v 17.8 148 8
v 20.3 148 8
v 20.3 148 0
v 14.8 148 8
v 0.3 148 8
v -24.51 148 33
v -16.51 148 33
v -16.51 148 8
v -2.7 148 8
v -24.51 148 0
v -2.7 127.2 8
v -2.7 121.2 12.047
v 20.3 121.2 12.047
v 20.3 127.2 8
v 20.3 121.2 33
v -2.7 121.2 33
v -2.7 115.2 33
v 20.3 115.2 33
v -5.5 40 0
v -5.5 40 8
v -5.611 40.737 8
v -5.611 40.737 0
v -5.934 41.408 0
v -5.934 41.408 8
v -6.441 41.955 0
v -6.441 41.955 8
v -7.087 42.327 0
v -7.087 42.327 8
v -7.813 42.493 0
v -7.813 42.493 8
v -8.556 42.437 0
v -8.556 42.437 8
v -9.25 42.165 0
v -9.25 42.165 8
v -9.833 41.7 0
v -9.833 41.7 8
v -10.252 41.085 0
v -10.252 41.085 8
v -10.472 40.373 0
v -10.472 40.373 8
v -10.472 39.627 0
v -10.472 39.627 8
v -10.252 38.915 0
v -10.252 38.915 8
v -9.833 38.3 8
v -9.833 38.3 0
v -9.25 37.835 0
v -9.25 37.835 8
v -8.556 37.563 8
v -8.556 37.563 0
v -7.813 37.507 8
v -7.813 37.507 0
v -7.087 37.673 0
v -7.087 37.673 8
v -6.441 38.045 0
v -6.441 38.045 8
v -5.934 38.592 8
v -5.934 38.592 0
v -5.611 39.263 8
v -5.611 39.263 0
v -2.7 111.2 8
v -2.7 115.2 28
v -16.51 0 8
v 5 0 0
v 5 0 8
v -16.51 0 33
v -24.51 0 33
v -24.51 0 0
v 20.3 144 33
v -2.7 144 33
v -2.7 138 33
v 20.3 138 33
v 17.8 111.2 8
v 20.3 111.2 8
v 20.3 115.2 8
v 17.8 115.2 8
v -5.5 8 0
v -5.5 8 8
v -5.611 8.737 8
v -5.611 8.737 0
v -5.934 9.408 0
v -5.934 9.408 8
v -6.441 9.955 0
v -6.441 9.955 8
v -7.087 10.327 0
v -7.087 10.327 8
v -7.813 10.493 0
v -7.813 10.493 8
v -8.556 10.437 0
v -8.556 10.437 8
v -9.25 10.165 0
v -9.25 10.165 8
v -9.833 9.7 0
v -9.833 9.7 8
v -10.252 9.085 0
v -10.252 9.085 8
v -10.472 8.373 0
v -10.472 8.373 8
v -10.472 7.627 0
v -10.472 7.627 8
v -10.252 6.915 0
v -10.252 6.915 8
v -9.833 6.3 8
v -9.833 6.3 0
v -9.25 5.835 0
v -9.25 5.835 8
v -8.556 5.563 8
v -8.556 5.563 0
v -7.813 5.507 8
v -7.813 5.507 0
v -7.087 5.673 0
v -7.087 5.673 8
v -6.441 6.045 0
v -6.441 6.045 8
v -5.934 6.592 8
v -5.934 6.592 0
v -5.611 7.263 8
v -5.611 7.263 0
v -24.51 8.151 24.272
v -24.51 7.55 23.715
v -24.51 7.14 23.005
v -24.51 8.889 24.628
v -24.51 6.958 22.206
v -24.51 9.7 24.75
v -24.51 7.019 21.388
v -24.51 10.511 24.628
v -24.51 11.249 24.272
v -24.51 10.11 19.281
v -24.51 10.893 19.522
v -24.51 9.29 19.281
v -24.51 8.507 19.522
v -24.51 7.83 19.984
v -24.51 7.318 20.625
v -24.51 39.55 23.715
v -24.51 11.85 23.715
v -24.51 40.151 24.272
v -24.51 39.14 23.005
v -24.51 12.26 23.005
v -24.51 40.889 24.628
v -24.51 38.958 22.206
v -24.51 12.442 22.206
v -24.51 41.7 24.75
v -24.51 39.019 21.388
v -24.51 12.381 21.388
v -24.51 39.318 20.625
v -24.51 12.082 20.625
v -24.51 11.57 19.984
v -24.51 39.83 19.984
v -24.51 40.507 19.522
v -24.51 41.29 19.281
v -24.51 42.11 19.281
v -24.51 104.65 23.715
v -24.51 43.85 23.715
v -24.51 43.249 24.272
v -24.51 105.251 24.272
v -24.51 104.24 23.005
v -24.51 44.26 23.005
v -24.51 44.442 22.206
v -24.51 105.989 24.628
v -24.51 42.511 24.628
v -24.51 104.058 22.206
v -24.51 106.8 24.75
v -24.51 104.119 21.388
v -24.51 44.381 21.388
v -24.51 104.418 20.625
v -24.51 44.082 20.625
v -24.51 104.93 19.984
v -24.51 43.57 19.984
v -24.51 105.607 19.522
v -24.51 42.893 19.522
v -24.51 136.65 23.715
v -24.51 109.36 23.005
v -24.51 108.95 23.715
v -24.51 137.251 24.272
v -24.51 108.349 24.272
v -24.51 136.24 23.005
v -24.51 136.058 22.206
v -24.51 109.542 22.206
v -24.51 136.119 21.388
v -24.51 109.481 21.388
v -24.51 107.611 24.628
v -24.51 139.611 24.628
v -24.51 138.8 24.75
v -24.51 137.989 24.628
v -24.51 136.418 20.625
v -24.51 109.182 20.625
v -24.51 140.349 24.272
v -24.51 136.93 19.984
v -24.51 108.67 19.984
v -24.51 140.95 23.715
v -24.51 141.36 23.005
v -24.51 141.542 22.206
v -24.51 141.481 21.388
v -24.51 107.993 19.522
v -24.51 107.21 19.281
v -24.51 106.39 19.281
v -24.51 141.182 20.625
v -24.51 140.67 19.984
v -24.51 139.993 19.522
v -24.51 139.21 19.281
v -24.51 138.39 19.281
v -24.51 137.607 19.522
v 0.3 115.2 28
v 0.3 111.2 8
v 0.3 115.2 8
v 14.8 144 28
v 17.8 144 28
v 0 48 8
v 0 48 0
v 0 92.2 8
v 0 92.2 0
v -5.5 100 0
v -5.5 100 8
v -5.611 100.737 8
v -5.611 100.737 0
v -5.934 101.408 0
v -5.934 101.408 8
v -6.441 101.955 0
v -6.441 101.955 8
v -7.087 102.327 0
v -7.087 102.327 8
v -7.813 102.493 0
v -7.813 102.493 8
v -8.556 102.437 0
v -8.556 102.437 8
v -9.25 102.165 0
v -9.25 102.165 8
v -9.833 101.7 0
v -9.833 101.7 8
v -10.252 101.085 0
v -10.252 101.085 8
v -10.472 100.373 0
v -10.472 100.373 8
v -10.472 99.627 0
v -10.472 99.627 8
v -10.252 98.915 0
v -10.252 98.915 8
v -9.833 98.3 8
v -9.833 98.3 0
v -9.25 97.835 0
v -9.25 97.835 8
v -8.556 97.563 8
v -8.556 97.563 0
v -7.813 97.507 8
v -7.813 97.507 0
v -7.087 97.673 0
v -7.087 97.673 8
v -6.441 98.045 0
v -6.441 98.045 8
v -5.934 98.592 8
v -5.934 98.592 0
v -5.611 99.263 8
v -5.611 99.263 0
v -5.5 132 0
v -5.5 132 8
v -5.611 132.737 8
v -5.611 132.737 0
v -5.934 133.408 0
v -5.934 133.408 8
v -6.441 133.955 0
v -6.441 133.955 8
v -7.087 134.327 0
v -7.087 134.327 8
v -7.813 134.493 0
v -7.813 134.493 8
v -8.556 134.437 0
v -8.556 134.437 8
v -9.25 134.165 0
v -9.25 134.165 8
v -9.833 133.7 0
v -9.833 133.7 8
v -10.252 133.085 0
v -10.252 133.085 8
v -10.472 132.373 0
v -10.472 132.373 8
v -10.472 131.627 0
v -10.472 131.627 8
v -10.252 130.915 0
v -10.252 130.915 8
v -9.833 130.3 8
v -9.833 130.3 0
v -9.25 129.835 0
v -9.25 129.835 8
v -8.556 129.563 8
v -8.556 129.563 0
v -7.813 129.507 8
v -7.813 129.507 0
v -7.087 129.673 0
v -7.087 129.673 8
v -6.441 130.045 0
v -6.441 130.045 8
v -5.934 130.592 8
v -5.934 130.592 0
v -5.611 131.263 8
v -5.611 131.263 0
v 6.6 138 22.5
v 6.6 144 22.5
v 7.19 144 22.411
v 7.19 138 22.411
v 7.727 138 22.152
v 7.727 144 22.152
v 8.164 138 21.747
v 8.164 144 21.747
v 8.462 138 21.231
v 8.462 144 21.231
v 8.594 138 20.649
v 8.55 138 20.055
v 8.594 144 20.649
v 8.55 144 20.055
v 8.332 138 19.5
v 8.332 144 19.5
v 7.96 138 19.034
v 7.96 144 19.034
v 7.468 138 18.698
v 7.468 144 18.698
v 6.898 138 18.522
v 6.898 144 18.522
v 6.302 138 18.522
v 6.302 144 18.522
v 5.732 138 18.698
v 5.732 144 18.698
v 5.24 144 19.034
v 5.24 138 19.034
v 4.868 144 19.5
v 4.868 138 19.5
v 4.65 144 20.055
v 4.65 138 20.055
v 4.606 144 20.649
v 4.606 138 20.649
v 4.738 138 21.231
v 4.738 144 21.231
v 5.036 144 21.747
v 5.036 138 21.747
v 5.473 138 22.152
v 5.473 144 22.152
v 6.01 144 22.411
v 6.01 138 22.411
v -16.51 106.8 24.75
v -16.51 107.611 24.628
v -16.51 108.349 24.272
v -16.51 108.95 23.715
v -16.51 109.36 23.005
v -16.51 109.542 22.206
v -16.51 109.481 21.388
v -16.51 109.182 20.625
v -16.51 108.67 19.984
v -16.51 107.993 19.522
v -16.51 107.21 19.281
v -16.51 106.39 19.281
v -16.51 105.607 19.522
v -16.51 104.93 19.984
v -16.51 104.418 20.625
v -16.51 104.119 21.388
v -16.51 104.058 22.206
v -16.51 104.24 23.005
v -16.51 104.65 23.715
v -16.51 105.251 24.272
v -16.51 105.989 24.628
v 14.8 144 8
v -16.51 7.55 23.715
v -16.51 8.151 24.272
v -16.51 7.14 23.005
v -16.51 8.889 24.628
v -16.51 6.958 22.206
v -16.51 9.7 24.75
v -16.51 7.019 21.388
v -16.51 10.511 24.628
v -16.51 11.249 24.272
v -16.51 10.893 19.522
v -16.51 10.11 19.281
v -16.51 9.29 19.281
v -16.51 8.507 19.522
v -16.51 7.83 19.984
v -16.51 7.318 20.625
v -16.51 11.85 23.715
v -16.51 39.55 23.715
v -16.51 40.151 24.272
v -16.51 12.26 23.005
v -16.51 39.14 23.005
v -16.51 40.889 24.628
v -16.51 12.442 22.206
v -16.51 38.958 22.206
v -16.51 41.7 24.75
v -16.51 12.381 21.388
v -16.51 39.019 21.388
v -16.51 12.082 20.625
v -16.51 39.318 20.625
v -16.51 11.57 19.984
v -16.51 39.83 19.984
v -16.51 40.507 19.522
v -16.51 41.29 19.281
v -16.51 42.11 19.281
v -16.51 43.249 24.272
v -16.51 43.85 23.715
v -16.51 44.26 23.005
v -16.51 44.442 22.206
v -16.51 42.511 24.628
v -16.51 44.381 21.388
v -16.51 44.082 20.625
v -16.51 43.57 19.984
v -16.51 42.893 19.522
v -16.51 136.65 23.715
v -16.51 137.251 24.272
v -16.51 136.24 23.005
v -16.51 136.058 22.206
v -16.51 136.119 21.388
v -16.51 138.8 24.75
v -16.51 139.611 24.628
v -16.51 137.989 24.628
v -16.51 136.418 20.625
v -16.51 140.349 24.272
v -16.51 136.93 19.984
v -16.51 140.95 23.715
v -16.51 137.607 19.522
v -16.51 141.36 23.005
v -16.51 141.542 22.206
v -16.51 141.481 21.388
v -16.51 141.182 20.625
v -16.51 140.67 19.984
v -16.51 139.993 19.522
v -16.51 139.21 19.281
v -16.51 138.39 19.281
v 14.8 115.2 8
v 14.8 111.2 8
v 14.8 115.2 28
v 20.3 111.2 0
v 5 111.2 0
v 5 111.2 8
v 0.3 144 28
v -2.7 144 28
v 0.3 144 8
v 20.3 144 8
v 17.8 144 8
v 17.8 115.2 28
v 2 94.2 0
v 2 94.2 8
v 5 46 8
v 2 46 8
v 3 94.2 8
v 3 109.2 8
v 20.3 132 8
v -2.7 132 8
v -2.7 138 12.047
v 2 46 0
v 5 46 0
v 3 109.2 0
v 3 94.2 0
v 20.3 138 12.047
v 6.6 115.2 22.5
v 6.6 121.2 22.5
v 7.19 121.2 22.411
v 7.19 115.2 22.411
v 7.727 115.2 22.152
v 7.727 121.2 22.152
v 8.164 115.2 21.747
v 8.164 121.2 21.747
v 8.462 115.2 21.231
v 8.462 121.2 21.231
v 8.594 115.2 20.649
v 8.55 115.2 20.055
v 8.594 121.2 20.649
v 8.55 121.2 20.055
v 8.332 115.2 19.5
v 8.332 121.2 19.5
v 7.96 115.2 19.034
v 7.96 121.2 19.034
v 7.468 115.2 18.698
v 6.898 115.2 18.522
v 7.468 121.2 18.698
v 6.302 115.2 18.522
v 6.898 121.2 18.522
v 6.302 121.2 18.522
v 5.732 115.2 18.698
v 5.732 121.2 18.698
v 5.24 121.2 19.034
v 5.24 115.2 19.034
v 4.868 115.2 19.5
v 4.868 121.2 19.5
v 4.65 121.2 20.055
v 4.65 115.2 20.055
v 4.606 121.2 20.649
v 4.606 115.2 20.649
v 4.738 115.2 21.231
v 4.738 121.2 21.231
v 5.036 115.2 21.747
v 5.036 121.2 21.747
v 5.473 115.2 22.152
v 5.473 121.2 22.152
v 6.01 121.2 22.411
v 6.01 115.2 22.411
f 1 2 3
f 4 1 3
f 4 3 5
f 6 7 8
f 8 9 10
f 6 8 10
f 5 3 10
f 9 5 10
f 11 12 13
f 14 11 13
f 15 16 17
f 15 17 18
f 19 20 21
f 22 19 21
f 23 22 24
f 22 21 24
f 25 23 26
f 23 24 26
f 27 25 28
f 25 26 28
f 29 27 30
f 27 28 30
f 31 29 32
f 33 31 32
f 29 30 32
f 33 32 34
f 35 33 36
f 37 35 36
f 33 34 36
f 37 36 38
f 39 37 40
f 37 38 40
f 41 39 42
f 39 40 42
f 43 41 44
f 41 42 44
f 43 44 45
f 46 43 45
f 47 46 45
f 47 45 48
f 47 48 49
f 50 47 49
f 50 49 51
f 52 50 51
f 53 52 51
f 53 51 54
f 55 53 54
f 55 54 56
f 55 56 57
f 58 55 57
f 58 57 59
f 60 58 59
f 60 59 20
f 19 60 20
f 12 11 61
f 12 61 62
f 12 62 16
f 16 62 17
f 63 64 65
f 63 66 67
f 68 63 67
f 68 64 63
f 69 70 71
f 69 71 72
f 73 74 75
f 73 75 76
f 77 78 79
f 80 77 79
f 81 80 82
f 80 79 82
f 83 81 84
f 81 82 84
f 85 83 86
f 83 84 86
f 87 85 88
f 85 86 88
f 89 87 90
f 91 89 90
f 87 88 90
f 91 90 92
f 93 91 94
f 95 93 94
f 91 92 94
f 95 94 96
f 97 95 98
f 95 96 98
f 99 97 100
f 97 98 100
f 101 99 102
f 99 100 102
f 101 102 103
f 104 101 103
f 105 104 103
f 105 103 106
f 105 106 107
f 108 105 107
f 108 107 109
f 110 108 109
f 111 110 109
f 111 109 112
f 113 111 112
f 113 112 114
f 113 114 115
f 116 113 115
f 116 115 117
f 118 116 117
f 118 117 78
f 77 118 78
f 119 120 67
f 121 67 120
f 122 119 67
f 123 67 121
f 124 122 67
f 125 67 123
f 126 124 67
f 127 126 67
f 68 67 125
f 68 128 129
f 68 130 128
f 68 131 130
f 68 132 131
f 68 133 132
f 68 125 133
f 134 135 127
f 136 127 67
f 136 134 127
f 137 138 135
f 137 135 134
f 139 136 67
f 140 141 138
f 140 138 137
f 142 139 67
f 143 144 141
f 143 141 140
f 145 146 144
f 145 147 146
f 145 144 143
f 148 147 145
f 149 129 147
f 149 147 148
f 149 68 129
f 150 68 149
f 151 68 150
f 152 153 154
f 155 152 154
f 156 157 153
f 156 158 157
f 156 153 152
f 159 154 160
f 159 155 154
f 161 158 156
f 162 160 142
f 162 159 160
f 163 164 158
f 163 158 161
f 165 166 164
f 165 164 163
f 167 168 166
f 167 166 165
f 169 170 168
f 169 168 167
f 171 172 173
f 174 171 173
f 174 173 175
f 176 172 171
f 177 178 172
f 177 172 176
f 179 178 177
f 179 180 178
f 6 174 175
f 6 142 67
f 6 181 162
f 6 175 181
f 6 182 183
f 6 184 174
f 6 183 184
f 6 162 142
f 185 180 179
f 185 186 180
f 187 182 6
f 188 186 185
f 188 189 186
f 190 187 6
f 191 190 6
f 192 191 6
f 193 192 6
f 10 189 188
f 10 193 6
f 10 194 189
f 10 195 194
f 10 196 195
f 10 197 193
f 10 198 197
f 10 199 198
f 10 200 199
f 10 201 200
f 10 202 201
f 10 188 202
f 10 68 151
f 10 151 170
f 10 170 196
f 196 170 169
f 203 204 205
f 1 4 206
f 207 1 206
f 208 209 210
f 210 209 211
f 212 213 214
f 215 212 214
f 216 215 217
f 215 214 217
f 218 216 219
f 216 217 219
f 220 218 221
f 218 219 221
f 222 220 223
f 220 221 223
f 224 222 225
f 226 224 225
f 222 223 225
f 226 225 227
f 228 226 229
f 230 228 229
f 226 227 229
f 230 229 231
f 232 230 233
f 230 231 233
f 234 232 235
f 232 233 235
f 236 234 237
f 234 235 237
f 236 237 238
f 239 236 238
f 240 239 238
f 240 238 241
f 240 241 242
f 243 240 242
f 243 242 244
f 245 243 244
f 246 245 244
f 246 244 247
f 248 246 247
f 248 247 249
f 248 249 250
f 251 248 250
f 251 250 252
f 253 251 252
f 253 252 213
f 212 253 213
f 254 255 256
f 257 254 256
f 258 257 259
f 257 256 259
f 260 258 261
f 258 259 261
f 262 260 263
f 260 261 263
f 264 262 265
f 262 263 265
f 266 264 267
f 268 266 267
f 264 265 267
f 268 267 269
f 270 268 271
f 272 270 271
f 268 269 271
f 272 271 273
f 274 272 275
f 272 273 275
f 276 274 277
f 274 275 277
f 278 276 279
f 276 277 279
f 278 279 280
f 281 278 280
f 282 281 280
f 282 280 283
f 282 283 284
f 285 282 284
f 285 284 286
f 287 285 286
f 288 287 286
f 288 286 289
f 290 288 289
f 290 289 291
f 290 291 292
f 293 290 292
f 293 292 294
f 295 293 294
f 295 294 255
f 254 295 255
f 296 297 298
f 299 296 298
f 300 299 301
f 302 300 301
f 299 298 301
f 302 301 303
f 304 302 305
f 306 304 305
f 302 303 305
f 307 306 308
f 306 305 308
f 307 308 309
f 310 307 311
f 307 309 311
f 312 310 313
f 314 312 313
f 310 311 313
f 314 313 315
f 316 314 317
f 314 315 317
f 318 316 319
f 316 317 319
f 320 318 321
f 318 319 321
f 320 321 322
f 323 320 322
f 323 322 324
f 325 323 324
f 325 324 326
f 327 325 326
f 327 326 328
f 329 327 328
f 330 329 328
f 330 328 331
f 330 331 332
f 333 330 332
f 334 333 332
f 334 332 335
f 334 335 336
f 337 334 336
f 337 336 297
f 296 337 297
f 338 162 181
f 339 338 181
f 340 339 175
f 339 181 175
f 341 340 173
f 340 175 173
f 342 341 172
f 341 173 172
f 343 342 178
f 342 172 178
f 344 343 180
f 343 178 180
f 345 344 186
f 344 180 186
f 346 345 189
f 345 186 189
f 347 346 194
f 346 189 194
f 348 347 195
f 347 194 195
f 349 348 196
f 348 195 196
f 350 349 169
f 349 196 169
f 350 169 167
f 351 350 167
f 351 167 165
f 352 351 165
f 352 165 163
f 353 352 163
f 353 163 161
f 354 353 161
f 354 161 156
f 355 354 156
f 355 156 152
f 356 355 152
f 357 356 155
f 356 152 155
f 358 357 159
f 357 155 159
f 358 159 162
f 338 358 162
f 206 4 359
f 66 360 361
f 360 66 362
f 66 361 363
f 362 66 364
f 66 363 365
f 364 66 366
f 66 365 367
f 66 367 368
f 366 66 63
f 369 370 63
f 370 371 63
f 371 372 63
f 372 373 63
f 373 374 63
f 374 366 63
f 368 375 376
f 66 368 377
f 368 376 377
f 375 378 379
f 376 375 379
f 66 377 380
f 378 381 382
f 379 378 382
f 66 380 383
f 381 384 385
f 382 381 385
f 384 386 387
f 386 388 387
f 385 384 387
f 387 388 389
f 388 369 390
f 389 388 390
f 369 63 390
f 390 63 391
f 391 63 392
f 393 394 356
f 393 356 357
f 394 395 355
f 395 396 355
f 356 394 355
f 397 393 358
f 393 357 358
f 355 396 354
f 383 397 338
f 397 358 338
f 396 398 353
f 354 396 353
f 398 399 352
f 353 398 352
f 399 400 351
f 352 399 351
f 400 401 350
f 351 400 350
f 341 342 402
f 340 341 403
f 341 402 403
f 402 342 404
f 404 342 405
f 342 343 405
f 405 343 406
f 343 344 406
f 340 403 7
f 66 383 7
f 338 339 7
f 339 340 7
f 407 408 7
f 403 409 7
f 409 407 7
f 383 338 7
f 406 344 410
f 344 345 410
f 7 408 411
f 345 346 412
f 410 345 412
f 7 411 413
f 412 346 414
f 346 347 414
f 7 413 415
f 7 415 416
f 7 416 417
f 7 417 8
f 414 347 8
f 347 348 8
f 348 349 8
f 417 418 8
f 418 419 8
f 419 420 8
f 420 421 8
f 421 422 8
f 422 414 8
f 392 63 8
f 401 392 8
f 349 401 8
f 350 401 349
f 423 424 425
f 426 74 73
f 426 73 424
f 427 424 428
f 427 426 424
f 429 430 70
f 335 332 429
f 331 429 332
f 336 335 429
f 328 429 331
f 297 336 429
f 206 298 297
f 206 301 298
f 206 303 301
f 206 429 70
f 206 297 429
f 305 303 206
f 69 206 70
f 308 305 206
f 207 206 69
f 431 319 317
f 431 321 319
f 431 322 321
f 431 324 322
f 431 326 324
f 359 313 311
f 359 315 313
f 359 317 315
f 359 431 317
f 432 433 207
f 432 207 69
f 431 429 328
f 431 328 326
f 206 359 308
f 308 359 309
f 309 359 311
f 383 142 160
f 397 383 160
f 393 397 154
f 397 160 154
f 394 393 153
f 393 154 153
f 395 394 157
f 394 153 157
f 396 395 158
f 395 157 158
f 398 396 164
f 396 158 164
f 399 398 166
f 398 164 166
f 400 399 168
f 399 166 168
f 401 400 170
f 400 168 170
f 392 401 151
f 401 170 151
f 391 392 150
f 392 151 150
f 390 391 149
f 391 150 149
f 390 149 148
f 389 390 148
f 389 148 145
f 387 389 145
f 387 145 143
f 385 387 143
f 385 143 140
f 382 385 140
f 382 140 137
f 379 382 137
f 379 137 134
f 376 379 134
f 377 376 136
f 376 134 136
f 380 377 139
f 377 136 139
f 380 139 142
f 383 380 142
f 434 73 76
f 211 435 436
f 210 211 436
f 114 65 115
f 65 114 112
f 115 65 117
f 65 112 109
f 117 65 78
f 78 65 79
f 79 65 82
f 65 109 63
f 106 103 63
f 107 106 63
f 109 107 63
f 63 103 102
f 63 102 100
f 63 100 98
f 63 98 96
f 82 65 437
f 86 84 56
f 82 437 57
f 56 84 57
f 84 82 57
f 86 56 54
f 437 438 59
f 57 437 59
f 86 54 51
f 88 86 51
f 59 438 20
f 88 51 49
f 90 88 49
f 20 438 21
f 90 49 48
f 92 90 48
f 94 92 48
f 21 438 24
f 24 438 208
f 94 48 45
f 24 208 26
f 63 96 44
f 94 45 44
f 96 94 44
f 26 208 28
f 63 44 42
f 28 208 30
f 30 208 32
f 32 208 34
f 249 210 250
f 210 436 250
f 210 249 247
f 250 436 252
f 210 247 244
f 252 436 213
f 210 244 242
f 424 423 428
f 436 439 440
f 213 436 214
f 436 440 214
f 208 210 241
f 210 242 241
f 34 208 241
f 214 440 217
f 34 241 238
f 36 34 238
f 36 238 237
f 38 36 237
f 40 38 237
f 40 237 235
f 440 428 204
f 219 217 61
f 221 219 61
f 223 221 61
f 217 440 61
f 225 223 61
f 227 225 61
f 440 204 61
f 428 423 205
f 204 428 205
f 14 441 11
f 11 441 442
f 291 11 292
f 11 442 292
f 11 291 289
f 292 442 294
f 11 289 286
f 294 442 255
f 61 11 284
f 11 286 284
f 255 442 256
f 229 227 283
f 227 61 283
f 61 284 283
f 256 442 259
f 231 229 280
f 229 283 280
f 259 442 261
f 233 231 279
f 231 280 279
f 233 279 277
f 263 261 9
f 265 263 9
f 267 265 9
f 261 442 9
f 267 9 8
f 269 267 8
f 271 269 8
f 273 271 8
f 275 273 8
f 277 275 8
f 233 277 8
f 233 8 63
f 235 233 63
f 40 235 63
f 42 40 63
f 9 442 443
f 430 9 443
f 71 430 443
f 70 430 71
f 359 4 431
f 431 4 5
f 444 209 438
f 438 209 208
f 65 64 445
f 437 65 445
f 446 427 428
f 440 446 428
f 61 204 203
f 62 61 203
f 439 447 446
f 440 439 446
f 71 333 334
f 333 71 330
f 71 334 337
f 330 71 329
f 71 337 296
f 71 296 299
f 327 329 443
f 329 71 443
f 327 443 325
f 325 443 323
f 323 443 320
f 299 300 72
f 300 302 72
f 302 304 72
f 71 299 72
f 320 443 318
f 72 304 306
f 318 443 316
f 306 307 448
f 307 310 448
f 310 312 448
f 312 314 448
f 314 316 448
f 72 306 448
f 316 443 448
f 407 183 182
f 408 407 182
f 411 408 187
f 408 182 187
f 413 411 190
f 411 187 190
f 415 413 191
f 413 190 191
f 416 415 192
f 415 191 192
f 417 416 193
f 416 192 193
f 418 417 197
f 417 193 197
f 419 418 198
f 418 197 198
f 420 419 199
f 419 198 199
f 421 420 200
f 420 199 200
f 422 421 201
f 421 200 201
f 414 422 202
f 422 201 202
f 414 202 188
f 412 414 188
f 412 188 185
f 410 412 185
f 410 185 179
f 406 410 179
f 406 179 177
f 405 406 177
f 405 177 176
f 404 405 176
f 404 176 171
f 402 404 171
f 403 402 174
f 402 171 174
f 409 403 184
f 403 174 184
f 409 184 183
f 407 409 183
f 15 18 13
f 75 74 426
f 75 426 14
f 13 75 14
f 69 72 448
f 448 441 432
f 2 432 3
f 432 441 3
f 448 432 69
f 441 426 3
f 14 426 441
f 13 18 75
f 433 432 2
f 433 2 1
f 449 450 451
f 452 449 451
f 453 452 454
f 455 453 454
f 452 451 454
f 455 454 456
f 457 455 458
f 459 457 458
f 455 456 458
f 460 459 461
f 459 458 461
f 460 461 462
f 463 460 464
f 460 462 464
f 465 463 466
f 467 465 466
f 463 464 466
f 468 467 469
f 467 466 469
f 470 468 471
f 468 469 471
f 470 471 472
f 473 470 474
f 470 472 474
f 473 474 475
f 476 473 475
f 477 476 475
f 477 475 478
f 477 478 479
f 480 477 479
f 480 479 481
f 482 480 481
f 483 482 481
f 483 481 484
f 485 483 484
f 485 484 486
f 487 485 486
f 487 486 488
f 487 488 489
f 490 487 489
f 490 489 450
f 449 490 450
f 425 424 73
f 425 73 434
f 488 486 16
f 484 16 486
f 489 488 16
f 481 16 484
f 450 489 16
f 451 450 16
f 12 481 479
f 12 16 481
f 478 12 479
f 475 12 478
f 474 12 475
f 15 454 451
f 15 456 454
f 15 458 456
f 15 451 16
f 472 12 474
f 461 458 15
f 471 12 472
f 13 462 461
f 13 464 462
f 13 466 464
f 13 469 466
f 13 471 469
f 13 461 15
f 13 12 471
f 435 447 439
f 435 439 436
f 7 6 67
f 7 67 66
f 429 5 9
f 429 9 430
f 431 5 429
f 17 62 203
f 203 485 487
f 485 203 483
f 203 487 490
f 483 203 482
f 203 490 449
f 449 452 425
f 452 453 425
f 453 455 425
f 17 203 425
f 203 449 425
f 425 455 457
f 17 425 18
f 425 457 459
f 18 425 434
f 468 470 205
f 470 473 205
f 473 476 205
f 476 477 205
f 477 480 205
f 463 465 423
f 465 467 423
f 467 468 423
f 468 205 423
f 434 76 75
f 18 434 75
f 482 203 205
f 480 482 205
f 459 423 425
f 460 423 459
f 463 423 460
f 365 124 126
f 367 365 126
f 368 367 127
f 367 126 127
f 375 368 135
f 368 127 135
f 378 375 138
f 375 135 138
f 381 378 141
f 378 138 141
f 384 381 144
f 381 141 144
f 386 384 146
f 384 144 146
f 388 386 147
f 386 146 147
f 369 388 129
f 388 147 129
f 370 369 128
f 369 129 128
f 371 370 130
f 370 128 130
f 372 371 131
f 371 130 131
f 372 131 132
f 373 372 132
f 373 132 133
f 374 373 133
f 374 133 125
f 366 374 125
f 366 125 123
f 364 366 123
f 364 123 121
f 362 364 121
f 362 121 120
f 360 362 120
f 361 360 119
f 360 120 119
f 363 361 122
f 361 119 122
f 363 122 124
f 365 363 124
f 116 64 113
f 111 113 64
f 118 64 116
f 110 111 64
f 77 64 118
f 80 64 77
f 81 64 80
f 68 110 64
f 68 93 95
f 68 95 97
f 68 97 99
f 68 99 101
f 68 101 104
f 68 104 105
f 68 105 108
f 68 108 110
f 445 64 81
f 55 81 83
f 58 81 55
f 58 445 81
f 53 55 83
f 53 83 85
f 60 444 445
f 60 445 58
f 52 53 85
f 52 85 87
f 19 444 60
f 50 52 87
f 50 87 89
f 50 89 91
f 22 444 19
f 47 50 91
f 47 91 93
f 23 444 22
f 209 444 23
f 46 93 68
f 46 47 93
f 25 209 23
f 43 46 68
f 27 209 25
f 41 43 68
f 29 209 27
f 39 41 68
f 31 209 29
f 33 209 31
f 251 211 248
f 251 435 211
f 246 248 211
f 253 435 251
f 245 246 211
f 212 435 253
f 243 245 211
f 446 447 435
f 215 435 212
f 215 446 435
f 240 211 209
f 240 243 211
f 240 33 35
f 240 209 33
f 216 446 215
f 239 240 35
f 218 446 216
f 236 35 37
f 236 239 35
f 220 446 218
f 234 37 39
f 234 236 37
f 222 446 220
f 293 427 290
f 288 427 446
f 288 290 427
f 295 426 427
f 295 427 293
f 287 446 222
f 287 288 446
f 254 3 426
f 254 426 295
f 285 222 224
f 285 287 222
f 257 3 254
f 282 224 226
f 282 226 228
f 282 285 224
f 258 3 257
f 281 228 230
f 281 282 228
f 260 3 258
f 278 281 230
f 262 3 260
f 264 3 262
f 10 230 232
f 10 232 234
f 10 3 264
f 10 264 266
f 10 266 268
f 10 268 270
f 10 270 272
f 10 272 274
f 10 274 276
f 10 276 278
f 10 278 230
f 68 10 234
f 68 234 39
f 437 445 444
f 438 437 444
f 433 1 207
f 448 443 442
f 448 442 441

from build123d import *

# Parameters (mm, degrees)
SKETCH1_W               = 24.51
SKETCH1_H               = 148
BOSS_EXTRUDE1_DEPTH     = 8
SKETCH2_W               = 8
SKETCH2_H               = 148
BOSS_EXTRUDE2_DEPTH     = 25
SKETCH4_W               = 20.3
SKETCH4_H               = 36.8
BOSS_EXTRUDE3_DEPTH     = 8
SKETCH5_W               = 23
SKETCH5_H               = 6
BOSS_EXTRUDE4_DEPTH     = 25
CUT_EXTRUDE2_REACH      = 151.752
SKETCH6_R               = 2
RIB1_REACH              = 159.03
SKETCH8_WALL_W          = 336.456302216
SKETCH8_WALL_H          = 3
MIRROR2_COPY_1_REACH    = 159.03
MIRROR2_COPY_1_SKETCH_W = 336.456302216
MIRROR2_COPY_1_SKETCH_H = 3
SKETCH3_R               = 2.5
CUT_EXTRUDE1_DEPTH      = 10
SKETCH12_R              = 2.75
CUT_EXTRUDE3_DEPTH      = 8
SKETCH13_W              = 5
SKETCH13_H              = 46
BOSS_EXTRUDE5_DEPTH     = 8
SKETCH14_W              = 3
SKETCH14_H              = 17
BOSS_EXTRUDE6_DEPTH     = 8
CHAMFER1_SIZE           = 2
CHAMFER2_SIZE           = 6
CHAMFER2_SIZE2          = 4.047051101


with BuildPart() as part:
    # Sketch1 → Boss-Extrude1 (new body)
    with BuildSketch(Plane.XY):
        with Locations((-12.255, 74)):
            Rectangle(SKETCH1_W, SKETCH1_H)
    extrude(amount=BOSS_EXTRUDE1_DEPTH)

    # Sketch2 → Boss-Extrude2 (add)
    with BuildSketch(Plane.XY.offset(8)):
        with Locations((-20.51, 74)):
            Rectangle(SKETCH2_W, SKETCH2_H)
    extrude(amount=BOSS_EXTRUDE2_DEPTH)

    # Sketch4 → Boss-Extrude3 (add)
    with BuildSketch(Plane(origin=(0, 0, 0), x_dir=(-1, 0, 0), z_dir=(0, 0, -1))):
        with Locations((-10.15, 129.6)):
            Rectangle(SKETCH4_W, SKETCH4_H)
    extrude(amount=-BOSS_EXTRUDE3_DEPTH)

    # Sketch5 → Boss-Extrude4 (add)
    with BuildSketch(Plane.XY.offset(8)):
        with Locations((8.8, 118.2)):
            Rectangle(SKETCH5_W, SKETCH5_H)
        with Locations((8.8, 141)):
            Rectangle(SKETCH5_W, SKETCH5_H)
    extrude(amount=BOSS_EXTRUDE4_DEPTH)

    # Cut-Extrude2: up to this face of the body (flat: up to its plane)
    cut_extrude2_end = Plane(part.part.faces().sort_by_distance((8.8, 115.2, 20.5))[0])
    # Sketch6 → Cut-Extrude2 (cut, up to the picked face)
    with BuildSketch(Plane(origin=(0, 144, 0), x_dir=(1, 0, 0), z_dir=(0, 1, 0)), mode=Mode.PRIVATE) as cut_extrude2_sk1:
        with Locations(Location((6.6, -20.5, 0), (0, 0, 270))):
            Circle(SKETCH6_R)
    cut_extrude2_tool1 = split(extrude(cut_extrude2_sk1.sketch, amount=-CUT_EXTRUDE2_REACH, mode=Mode.PRIVATE), bisect_by=cut_extrude2_end, keep=Keep.BOTH, mode=Mode.PRIVATE)
    add(cut_extrude2_tool1.solids().sort_by(Axis((6.6, 144, 20.5), (0, -1, 0)))[0], mode=Mode.SUBTRACT)

    # Sketch8 wall → Rib1 (add, up to next)
    with BuildSketch(Plane(origin=(16.3, 146, 18), x_dir=(0, -0.196116135138, 0.980580675691), z_dir=(0, -0.980580675691, -0.196116135138)), mode=Mode.PRIVATE) as rib1_sk1:
        Rectangle(SKETCH8_WALL_W, SKETCH8_WALL_H)
    rib1_tool1 = extrude(rib1_sk1.sketch, amount=RIB1_REACH, mode=Mode.PRIVATE) - part.part
    rib1 = rib1_tool1.solids().sort_by_distance((16.3, 146, 18))[0]
    add(rib1)

    # Mirror1: Rib1 across plane
    add(rib1.mirror(Plane.ZX.offset(129.6)))

    # Mirror2: Rib1 across plane
    add(rib1.mirror(Plane.ZY.offset(-7.55)))

    # Mirror2 copy 1 sketch → Mirror2 copy 1 (add, up to next)
    with BuildSketch(Plane(origin=(-1.2, 113.2, 18), x_dir=(0, 0.196116135138, 0.980580675691), z_dir=(0, 0.980580675691, -0.196116135138)), mode=Mode.PRIVATE) as mirror2_copy_1_sk1:
        Rectangle(MIRROR2_COPY_1_SKETCH_W, MIRROR2_COPY_1_SKETCH_H)
    mirror2_copy_1_tool1 = extrude(mirror2_copy_1_sk1.sketch, amount=MIRROR2_COPY_1_REACH, mode=Mode.PRIVATE) - part.part
    add(mirror2_copy_1_tool1.solids().sort_by_distance((-1.2, 113.2, 18))[0])

    # Sketch3 → Cut-Extrude1 (cut)
    with BuildSketch(Plane.XY.offset(8)):
        with Locations((-8, 8)):
            Circle(SKETCH3_R)
        with Locations((-8, 40)):
            Circle(SKETCH3_R)
        with Locations((-8, 100)):
            Circle(SKETCH3_R)
        with Locations((-8, 132)):
            Circle(SKETCH3_R)
    extrude(amount=-CUT_EXTRUDE1_DEPTH, mode=Mode.SUBTRACT)

    # Sketch12 → Cut-Extrude3 (cut)
    with BuildSketch(Plane.ZY.offset(24.51)):
        with Locations((22, 138.8)):
            Circle(SKETCH12_R)
        with Locations((22, 106.8)):
            Circle(SKETCH12_R)
        with Locations((22, 41.7)):
            Circle(SKETCH12_R)
        with Locations((22, 9.7)):
            Circle(SKETCH12_R)
    extrude(amount=-CUT_EXTRUDE3_DEPTH, mode=Mode.SUBTRACT)

    # Sketch13 → Boss-Extrude5 (add)
    with BuildSketch(Plane(origin=(0, 0, 0), x_dir=(-1, 0, 0), z_dir=(0, 0, -1))):
        with Locations((-2.5, 23)):
            Rectangle(SKETCH13_W, SKETCH13_H)
    extrude(amount=-BOSS_EXTRUDE5_DEPTH)

    # Sketch14 → Boss-Extrude6 (add)
    with BuildSketch(Plane(origin=(0, 0, 0), x_dir=(-1, 0, 0), z_dir=(0, 0, -1))):
        with Locations((-1.5, 102.7)):
            Rectangle(SKETCH14_W, SKETCH14_H)
    extrude(amount=-BOSS_EXTRUDE6_DEPTH)

    # Chamfer1
    chamfer1_edges = [part.edges().sort_by_distance(p)[0] for p in [
        (0, 46, 4),
        (3, 111.2, 4),
        (0, 94.2, 4),
    ]]
    chamfer(chamfer1_edges, length=CHAMFER1_SIZE)

    # Chamfer2
    chamfer2_edges = [part.edges().sort_by_distance(p)[0] for p in [
        (8.8, 121.2, 8),
        (8.8, 138, 8),
    ]]
    chamfer2_side = [part.faces().sort_by_distance(p)[0] for p in [
        (-4.974591741, 76.782250606, 8),
    ]]
    chamfer(chamfer2_edges, length=CHAMFER2_SIZE, length2=CHAMFER2_SIZE2, reference=chamfer2_side[0])


solid = part.part
